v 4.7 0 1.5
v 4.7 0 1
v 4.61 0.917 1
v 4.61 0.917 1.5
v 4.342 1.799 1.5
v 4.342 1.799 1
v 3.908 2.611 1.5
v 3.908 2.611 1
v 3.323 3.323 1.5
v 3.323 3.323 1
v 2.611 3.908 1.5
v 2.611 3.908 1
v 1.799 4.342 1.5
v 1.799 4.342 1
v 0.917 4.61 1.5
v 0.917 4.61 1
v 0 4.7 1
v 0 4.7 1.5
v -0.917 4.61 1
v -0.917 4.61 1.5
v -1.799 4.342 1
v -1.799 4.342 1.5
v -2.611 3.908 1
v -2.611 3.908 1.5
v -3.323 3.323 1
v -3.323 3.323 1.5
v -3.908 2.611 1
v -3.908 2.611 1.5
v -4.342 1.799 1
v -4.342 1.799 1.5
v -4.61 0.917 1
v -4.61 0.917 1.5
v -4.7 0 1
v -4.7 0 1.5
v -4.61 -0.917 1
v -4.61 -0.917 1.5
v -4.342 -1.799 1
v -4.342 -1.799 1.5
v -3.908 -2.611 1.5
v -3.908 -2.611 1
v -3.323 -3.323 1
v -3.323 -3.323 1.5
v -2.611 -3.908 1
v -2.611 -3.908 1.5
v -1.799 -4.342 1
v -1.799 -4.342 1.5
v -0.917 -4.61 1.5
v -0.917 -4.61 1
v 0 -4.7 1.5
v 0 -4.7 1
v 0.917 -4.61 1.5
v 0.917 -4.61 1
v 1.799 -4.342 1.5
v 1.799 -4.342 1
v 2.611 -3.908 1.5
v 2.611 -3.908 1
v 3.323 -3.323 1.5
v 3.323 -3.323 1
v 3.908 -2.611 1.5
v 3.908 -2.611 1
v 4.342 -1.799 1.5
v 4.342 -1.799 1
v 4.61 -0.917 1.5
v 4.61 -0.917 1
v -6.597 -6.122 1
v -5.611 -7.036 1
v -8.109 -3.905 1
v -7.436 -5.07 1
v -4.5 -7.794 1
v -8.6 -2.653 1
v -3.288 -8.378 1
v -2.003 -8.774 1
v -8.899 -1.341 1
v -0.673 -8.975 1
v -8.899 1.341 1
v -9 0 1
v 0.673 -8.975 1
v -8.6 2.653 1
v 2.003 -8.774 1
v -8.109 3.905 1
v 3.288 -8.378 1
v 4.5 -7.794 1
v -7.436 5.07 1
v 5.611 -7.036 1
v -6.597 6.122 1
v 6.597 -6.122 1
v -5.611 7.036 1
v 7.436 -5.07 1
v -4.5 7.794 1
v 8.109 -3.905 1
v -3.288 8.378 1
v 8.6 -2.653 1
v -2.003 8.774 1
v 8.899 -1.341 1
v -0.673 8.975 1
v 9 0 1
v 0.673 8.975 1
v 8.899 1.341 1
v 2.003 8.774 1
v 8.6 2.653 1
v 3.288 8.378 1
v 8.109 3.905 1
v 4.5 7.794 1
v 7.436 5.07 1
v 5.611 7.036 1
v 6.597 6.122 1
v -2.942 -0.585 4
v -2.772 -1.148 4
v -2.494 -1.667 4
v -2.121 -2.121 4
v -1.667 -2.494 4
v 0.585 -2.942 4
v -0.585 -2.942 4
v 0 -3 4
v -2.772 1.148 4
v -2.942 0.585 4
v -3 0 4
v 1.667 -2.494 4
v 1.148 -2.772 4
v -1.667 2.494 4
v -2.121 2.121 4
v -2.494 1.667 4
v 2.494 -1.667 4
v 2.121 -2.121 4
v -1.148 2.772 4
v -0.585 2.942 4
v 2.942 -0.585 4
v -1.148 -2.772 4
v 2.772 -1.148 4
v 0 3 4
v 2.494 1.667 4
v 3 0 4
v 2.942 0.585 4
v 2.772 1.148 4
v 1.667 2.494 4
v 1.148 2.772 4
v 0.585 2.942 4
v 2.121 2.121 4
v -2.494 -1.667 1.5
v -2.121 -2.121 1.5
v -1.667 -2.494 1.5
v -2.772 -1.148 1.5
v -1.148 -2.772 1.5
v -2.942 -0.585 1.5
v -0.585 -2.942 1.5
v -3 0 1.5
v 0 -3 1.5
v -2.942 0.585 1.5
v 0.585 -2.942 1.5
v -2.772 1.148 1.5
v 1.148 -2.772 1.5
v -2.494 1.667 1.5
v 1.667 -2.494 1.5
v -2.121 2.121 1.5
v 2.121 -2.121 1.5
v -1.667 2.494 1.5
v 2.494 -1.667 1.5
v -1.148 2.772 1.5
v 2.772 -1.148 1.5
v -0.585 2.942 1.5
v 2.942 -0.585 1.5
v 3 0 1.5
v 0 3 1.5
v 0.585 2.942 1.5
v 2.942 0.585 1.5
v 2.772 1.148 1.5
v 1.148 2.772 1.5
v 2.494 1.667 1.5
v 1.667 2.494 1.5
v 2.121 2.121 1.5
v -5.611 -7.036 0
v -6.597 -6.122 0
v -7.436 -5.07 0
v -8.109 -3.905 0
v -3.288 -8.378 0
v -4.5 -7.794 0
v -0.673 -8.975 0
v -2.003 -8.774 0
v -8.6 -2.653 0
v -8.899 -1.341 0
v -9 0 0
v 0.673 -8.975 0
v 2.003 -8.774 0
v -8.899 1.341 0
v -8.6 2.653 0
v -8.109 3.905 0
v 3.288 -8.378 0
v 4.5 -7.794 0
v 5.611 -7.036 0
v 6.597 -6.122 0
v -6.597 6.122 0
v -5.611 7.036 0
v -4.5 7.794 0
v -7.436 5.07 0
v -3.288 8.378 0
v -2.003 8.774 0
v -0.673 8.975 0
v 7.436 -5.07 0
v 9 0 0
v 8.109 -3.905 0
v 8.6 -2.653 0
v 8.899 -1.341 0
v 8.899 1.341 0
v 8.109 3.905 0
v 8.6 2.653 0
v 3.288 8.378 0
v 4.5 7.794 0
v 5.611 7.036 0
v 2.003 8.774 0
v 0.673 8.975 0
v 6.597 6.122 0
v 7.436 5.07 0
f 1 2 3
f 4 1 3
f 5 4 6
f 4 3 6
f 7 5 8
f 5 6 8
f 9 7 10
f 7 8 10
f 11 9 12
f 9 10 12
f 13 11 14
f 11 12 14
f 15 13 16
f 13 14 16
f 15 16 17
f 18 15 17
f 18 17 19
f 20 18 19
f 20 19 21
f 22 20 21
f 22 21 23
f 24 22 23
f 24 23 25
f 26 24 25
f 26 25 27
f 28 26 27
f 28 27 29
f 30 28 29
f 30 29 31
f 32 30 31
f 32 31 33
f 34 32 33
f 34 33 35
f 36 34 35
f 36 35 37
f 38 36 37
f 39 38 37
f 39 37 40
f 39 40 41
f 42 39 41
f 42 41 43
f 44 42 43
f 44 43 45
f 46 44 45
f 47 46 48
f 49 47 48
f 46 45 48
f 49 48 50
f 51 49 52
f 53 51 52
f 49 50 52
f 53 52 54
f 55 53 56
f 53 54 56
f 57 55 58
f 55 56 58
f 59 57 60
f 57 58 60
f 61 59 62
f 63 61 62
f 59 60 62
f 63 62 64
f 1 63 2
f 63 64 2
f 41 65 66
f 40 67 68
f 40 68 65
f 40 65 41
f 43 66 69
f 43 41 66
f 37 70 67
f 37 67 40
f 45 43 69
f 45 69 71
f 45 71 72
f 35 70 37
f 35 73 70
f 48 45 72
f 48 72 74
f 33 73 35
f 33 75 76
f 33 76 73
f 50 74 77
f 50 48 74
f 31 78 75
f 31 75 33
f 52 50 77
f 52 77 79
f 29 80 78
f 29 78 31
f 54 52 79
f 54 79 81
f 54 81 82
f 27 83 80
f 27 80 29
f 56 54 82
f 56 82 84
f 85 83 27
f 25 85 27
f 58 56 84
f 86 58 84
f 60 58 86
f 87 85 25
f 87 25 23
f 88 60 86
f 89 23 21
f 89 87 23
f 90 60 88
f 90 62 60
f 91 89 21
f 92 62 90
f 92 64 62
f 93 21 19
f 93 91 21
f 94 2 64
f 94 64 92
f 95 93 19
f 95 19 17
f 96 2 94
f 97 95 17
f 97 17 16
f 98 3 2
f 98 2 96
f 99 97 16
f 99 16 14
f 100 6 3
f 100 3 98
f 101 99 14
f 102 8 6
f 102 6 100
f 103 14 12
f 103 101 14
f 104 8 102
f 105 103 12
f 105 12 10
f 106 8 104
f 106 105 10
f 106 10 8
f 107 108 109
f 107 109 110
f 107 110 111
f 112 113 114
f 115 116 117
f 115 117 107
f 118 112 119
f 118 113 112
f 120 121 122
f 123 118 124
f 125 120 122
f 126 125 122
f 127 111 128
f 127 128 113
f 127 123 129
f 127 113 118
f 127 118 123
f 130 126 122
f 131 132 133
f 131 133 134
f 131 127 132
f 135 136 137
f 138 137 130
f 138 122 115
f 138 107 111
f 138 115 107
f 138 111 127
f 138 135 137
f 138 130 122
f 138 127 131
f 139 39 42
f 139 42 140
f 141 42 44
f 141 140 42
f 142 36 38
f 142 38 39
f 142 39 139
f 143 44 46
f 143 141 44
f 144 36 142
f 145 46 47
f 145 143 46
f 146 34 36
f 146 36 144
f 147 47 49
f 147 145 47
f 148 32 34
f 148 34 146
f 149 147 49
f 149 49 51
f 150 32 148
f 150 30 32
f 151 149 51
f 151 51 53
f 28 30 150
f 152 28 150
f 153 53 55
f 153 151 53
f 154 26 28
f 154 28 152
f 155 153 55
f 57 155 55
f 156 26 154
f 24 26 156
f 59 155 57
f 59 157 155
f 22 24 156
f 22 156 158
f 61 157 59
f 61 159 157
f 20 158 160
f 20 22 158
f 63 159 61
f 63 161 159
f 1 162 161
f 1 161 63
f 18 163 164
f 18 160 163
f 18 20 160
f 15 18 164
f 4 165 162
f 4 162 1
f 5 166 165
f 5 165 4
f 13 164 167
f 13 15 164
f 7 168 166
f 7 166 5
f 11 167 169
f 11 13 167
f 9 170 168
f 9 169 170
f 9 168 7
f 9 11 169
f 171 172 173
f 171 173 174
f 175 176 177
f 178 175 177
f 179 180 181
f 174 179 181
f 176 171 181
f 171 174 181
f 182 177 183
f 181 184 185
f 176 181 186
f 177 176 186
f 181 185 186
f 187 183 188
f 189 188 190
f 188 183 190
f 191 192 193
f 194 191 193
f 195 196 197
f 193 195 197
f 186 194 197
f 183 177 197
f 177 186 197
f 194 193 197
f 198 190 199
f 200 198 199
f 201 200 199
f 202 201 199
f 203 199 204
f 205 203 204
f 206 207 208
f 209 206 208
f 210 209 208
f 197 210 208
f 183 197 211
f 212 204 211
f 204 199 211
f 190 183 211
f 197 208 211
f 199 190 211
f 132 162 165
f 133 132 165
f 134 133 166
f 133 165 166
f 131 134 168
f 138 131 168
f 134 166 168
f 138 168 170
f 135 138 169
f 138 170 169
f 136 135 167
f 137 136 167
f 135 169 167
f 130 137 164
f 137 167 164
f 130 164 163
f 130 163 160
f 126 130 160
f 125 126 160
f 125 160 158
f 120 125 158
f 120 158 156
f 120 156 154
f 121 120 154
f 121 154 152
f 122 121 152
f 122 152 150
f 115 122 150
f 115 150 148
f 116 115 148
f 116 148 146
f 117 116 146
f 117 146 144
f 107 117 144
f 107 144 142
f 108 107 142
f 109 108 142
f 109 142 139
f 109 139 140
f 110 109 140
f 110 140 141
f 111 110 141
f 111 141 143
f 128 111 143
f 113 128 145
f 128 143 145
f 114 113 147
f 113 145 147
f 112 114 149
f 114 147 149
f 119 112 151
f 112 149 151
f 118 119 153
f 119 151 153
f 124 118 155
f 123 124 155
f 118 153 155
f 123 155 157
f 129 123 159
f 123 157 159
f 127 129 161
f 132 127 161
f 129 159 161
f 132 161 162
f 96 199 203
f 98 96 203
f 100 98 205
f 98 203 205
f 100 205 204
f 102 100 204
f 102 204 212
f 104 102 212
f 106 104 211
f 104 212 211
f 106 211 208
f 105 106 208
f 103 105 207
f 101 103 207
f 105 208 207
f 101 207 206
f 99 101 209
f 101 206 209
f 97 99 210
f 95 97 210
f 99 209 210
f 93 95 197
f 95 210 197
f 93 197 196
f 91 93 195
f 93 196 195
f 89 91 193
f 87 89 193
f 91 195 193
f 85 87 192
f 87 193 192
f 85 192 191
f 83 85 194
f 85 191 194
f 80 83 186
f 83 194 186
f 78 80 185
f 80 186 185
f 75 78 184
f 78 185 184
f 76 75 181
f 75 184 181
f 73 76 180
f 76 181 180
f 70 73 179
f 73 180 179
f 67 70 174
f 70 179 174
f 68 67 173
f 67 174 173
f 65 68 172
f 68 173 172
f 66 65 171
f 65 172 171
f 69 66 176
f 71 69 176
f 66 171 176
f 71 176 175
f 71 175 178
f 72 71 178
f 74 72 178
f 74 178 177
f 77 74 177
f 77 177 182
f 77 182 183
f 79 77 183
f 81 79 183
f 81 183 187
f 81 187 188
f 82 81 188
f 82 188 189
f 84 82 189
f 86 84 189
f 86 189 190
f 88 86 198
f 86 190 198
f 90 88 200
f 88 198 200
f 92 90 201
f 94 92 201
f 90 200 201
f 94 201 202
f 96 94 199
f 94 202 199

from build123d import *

# Parameters (mm, degrees)
F0_R     = 3
F1_DEPTH = 4
F0_R_2   = 9
F0_R_3   = 4.7
F2_DEPTH = 1
F3_DEPTH = 1.5


with BuildPart() as f1:
    # F0 (on Top) → F1 (new body)
    with BuildSketch(Plane.XY):
        Circle(F0_R)
    extrude(amount=F1_DEPTH)



with BuildPart() as f2:
    # F0 (on Top) → F2 (new body)
    with BuildSketch(Plane.XY):
        Circle(F0_R_2)
        Circle(F0_R_3, mode=Mode.SUBTRACT)
    extrude(amount=F2_DEPTH)


with BuildPart() as f1_1:
    add(f1.part)

    add(f2.part)  # F3 merges F2
    # F0 (on Top) → F3 (join)
    with BuildSketch(Plane.XY):
        Circle(F0_R_3)
        Circle(F0_R, mode=Mode.SUBTRACT)
    extrude(amount=F3_DEPTH)


solid = f1_1.part
